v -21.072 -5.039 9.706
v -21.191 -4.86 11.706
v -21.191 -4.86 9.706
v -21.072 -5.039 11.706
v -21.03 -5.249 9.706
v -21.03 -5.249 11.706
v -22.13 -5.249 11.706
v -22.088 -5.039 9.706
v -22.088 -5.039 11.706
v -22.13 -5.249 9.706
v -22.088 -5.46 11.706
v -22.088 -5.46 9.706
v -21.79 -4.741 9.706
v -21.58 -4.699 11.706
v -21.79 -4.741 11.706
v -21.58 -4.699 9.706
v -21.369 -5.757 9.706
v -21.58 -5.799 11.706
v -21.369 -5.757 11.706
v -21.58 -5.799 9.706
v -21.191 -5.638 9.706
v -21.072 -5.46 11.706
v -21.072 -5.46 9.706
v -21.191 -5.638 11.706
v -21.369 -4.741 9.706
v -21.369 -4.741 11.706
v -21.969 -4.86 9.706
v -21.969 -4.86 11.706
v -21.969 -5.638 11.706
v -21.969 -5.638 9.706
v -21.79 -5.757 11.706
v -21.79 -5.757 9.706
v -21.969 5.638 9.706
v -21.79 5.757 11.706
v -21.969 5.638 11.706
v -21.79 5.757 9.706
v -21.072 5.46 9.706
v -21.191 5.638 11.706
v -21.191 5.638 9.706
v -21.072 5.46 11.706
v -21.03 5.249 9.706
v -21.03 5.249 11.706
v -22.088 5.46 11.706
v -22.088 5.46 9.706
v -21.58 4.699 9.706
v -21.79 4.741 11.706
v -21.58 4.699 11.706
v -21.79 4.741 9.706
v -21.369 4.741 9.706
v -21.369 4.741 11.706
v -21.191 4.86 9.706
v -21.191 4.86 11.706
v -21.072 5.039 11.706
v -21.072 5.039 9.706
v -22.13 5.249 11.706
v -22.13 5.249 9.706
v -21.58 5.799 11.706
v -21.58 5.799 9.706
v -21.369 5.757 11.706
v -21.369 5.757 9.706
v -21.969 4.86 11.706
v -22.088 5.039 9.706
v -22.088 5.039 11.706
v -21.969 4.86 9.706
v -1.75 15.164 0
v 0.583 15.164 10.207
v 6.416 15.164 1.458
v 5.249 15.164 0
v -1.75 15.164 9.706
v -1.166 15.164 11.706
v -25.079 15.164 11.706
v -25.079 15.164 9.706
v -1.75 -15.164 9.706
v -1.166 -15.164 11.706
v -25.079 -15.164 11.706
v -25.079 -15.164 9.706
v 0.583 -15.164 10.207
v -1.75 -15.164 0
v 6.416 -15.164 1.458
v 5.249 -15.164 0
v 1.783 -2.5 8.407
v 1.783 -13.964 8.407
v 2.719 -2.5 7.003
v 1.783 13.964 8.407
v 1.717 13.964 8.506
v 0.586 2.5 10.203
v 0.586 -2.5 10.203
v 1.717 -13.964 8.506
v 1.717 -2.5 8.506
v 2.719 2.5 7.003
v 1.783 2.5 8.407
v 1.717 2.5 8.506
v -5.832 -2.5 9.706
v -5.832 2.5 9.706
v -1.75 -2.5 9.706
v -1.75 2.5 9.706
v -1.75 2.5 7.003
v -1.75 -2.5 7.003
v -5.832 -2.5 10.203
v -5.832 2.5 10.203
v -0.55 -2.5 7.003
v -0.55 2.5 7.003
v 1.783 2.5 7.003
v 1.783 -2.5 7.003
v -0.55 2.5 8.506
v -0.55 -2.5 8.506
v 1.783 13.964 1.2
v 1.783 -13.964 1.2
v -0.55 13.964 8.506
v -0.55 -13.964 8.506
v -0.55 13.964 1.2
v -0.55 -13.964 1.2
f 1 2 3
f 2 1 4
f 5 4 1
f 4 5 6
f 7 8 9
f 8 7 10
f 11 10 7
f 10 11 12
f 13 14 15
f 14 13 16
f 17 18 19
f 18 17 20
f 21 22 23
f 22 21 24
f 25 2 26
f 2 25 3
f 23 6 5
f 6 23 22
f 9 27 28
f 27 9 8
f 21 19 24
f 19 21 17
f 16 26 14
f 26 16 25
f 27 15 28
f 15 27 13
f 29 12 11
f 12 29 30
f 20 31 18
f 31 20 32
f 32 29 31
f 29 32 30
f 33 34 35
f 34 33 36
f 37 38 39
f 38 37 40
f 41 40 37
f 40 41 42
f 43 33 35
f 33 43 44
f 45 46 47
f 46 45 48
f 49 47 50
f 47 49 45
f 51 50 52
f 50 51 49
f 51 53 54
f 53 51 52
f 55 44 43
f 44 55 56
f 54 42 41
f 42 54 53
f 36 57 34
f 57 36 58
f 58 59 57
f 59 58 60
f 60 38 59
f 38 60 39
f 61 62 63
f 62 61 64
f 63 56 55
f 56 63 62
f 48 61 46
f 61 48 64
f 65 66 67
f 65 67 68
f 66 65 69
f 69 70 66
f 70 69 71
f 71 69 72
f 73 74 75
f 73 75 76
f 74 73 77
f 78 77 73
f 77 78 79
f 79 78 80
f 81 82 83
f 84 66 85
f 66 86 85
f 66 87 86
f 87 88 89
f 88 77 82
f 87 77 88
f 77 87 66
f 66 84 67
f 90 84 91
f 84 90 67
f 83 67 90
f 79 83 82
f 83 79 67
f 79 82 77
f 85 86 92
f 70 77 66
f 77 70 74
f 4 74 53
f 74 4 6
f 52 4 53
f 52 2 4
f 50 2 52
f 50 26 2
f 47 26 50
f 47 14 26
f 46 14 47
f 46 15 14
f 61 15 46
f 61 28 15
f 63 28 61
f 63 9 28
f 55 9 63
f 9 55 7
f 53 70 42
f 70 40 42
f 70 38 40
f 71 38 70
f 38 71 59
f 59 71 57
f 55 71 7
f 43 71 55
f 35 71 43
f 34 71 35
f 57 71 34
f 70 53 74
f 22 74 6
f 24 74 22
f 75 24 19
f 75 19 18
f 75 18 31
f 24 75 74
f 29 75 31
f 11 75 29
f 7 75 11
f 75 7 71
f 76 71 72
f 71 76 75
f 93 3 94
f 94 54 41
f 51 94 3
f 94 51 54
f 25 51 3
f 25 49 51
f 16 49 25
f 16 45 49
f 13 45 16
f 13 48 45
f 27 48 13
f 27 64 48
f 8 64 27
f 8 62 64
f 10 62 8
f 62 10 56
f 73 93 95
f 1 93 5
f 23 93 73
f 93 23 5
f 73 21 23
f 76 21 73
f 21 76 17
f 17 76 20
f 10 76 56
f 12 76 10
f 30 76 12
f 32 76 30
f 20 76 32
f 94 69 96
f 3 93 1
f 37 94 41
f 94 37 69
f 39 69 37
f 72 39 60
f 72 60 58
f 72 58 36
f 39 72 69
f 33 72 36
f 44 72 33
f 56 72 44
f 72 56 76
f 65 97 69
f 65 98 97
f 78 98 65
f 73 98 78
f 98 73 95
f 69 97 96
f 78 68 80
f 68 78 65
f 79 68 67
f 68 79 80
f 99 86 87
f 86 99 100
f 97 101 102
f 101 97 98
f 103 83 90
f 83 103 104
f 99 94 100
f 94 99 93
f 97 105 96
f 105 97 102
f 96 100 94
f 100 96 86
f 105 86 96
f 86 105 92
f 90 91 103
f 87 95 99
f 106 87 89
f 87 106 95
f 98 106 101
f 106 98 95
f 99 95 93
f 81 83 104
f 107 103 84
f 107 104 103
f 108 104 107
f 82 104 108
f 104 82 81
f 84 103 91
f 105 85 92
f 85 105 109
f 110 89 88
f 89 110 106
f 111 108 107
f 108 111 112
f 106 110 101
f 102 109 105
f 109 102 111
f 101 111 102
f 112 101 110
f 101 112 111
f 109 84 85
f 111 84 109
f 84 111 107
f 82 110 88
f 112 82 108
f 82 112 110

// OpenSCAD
// file: ../../library/e7_all.scad
// ==========================================================================
//  e7_all.scad - include this one file. Preview, print plates and the report.
// ==========================================================================
include <e7_params.scad>
include <e7_body.scad>

// whole painted loco
module e7_preview() {
  // carbody in its paint bands
  for (i = [0:len(PAINT_BANDS) - 1]) {
    z0 = i == 0 ? -1 : p(PAINT_BANDS[i - 1][0]);
    z1 = i == len(PAINT_BANDS) - 1 ? 1000 : p(PAINT_BANDS[i][0]);
    color(PAINT_BANDS[i][1]) render(convexity = 8) e7_shell_solid([z0, z1]);
  }
  color(C_GLASS) e7_glass();
  color(C_LENS) let (d = nose_d_at_z(HEADLIGHT[0]))
    translate([XF - p(d) + p(HEADLIGHT[2]) + p(1.5), 0, p(HEADLIGHT[0])]) rotate([0, 90, 0]) cylinder(d = p(HEADLIGHT[1]) - 0.8, h = 0.5, $fn = 32);
  color(C_FRAME) { for (j = [1:NFRAME]) e7_frame_piece(j); e7_pilot(); e7_pilot_rear(); }
  for (tx = [TRK_X, -TRK_X]) translate([tx, 0, 0]) { color(C_TRUCK) e7_truck_frame(); color(C_WHEEL) e7_wheels(); }
}
// thin glass panes sitting in the window pockets (preview only)
module e7_glass() {
  intersection() { e7_loft(DET * 0.6); union() { e7_windshield_cut(); e7_side_cuts_windows_only(); } }
}
module e7_side_cuts_windows_only() {
  for (s = [-1, 1], w = CAB_WIN)
    translate([XF - p(w[1]), s * HW - (s > 0 ? DET : 3 - DET), p(w[2])]) cube([p(w[1] - w[0]), 3, p(w[3] - w[2])]);
}

// one print, laid out for the printer
module e7_plate(part) {
  sec = [for (k = [1:NSEC]) str("body_", k)];
  frm = [for (j = [1:NFRAME]) str("frame_", j)];
  if (is_num(search([part], sec)[0])) {
    k = search([part], sec)[0] + 1;
    // stand the section on its open bottom (skirt edge on the bed)
    translate([-sec_x0(k) - SEC_L / 2, 0, -Z_SKIRT]) e7_body_section(k);
  } else if (is_num(search([part], frm)[0])) {
    j = search([part], frm)[0] + 1;
    xs = concat([FRAME_X0], FRAME_SPLITS, [FRAME_X1]);
    translate([-(xs[j - 1] + xs[j]) / 2, 0, -Z_FRAME_BOT]) e7_frame_piece(j);
  } else if (part == "pilot") {
    translate([-XF, 0, 0]) rotate([0, 0, 0]) translate([0, 0, -p(5)]) e7_pilot();
  } else if (part == "pilot_rear") {
    translate([-XR, 0, 0]) translate([0, 0, -(CPL_Z - CPL_H / 2 - WALL)]) e7_pilot_rear();
  } else if (part == "truck") {
    // upside down, bolster on the bed
    translate([0, 0, Z_FRAME_BOT - 0.3]) rotate([180, 0, 0]) e7_truck_frame();
  } else {
    assert(false, str("unknown part '", part, "'"));
  }
}

module e7_report() {
  echo(str("MILW E7A ", ROAD_NO, " class ", CLASS, " - ", SC, " scale 1:", RATIO, ", paint ", PAINT));
  echo(str("  carbody ", round(BL), " mm long, ", round(2 * HW), " mm wide, roof ", round(Z_ROOF), " mm, cab ", round(Z_CAB), " mm above rail"));
  echo(str("  ", NSEC, " body sections of ", round(SEC_L), " mm; ", NFRAME, " frame pieces; trucks at +/- ", round(TRK_X), " mm"));
  echo(str("  body screws ", SCREW_BODY_NAME, " x ", 2 * len(BOSS_X), "; truck pivots ", PIVOT[1], "; wheels ", round(WHEEL_D * 10) / 10, " mm (bought)"));
}
// main file
// Milwaukee Road E7A, HO scale 1-87 - print 4 of 6: pilot - front pilot with coupler pocket
// Render (F6), export STL, print. Settings: ../../library/e7_params.scad
// Whole loco preview and notes: ../../MILW_E7_Main.scad
SCALE_SEL = "HO";
include <../../library/e7_all.scad>
e7_plate("pilot");
